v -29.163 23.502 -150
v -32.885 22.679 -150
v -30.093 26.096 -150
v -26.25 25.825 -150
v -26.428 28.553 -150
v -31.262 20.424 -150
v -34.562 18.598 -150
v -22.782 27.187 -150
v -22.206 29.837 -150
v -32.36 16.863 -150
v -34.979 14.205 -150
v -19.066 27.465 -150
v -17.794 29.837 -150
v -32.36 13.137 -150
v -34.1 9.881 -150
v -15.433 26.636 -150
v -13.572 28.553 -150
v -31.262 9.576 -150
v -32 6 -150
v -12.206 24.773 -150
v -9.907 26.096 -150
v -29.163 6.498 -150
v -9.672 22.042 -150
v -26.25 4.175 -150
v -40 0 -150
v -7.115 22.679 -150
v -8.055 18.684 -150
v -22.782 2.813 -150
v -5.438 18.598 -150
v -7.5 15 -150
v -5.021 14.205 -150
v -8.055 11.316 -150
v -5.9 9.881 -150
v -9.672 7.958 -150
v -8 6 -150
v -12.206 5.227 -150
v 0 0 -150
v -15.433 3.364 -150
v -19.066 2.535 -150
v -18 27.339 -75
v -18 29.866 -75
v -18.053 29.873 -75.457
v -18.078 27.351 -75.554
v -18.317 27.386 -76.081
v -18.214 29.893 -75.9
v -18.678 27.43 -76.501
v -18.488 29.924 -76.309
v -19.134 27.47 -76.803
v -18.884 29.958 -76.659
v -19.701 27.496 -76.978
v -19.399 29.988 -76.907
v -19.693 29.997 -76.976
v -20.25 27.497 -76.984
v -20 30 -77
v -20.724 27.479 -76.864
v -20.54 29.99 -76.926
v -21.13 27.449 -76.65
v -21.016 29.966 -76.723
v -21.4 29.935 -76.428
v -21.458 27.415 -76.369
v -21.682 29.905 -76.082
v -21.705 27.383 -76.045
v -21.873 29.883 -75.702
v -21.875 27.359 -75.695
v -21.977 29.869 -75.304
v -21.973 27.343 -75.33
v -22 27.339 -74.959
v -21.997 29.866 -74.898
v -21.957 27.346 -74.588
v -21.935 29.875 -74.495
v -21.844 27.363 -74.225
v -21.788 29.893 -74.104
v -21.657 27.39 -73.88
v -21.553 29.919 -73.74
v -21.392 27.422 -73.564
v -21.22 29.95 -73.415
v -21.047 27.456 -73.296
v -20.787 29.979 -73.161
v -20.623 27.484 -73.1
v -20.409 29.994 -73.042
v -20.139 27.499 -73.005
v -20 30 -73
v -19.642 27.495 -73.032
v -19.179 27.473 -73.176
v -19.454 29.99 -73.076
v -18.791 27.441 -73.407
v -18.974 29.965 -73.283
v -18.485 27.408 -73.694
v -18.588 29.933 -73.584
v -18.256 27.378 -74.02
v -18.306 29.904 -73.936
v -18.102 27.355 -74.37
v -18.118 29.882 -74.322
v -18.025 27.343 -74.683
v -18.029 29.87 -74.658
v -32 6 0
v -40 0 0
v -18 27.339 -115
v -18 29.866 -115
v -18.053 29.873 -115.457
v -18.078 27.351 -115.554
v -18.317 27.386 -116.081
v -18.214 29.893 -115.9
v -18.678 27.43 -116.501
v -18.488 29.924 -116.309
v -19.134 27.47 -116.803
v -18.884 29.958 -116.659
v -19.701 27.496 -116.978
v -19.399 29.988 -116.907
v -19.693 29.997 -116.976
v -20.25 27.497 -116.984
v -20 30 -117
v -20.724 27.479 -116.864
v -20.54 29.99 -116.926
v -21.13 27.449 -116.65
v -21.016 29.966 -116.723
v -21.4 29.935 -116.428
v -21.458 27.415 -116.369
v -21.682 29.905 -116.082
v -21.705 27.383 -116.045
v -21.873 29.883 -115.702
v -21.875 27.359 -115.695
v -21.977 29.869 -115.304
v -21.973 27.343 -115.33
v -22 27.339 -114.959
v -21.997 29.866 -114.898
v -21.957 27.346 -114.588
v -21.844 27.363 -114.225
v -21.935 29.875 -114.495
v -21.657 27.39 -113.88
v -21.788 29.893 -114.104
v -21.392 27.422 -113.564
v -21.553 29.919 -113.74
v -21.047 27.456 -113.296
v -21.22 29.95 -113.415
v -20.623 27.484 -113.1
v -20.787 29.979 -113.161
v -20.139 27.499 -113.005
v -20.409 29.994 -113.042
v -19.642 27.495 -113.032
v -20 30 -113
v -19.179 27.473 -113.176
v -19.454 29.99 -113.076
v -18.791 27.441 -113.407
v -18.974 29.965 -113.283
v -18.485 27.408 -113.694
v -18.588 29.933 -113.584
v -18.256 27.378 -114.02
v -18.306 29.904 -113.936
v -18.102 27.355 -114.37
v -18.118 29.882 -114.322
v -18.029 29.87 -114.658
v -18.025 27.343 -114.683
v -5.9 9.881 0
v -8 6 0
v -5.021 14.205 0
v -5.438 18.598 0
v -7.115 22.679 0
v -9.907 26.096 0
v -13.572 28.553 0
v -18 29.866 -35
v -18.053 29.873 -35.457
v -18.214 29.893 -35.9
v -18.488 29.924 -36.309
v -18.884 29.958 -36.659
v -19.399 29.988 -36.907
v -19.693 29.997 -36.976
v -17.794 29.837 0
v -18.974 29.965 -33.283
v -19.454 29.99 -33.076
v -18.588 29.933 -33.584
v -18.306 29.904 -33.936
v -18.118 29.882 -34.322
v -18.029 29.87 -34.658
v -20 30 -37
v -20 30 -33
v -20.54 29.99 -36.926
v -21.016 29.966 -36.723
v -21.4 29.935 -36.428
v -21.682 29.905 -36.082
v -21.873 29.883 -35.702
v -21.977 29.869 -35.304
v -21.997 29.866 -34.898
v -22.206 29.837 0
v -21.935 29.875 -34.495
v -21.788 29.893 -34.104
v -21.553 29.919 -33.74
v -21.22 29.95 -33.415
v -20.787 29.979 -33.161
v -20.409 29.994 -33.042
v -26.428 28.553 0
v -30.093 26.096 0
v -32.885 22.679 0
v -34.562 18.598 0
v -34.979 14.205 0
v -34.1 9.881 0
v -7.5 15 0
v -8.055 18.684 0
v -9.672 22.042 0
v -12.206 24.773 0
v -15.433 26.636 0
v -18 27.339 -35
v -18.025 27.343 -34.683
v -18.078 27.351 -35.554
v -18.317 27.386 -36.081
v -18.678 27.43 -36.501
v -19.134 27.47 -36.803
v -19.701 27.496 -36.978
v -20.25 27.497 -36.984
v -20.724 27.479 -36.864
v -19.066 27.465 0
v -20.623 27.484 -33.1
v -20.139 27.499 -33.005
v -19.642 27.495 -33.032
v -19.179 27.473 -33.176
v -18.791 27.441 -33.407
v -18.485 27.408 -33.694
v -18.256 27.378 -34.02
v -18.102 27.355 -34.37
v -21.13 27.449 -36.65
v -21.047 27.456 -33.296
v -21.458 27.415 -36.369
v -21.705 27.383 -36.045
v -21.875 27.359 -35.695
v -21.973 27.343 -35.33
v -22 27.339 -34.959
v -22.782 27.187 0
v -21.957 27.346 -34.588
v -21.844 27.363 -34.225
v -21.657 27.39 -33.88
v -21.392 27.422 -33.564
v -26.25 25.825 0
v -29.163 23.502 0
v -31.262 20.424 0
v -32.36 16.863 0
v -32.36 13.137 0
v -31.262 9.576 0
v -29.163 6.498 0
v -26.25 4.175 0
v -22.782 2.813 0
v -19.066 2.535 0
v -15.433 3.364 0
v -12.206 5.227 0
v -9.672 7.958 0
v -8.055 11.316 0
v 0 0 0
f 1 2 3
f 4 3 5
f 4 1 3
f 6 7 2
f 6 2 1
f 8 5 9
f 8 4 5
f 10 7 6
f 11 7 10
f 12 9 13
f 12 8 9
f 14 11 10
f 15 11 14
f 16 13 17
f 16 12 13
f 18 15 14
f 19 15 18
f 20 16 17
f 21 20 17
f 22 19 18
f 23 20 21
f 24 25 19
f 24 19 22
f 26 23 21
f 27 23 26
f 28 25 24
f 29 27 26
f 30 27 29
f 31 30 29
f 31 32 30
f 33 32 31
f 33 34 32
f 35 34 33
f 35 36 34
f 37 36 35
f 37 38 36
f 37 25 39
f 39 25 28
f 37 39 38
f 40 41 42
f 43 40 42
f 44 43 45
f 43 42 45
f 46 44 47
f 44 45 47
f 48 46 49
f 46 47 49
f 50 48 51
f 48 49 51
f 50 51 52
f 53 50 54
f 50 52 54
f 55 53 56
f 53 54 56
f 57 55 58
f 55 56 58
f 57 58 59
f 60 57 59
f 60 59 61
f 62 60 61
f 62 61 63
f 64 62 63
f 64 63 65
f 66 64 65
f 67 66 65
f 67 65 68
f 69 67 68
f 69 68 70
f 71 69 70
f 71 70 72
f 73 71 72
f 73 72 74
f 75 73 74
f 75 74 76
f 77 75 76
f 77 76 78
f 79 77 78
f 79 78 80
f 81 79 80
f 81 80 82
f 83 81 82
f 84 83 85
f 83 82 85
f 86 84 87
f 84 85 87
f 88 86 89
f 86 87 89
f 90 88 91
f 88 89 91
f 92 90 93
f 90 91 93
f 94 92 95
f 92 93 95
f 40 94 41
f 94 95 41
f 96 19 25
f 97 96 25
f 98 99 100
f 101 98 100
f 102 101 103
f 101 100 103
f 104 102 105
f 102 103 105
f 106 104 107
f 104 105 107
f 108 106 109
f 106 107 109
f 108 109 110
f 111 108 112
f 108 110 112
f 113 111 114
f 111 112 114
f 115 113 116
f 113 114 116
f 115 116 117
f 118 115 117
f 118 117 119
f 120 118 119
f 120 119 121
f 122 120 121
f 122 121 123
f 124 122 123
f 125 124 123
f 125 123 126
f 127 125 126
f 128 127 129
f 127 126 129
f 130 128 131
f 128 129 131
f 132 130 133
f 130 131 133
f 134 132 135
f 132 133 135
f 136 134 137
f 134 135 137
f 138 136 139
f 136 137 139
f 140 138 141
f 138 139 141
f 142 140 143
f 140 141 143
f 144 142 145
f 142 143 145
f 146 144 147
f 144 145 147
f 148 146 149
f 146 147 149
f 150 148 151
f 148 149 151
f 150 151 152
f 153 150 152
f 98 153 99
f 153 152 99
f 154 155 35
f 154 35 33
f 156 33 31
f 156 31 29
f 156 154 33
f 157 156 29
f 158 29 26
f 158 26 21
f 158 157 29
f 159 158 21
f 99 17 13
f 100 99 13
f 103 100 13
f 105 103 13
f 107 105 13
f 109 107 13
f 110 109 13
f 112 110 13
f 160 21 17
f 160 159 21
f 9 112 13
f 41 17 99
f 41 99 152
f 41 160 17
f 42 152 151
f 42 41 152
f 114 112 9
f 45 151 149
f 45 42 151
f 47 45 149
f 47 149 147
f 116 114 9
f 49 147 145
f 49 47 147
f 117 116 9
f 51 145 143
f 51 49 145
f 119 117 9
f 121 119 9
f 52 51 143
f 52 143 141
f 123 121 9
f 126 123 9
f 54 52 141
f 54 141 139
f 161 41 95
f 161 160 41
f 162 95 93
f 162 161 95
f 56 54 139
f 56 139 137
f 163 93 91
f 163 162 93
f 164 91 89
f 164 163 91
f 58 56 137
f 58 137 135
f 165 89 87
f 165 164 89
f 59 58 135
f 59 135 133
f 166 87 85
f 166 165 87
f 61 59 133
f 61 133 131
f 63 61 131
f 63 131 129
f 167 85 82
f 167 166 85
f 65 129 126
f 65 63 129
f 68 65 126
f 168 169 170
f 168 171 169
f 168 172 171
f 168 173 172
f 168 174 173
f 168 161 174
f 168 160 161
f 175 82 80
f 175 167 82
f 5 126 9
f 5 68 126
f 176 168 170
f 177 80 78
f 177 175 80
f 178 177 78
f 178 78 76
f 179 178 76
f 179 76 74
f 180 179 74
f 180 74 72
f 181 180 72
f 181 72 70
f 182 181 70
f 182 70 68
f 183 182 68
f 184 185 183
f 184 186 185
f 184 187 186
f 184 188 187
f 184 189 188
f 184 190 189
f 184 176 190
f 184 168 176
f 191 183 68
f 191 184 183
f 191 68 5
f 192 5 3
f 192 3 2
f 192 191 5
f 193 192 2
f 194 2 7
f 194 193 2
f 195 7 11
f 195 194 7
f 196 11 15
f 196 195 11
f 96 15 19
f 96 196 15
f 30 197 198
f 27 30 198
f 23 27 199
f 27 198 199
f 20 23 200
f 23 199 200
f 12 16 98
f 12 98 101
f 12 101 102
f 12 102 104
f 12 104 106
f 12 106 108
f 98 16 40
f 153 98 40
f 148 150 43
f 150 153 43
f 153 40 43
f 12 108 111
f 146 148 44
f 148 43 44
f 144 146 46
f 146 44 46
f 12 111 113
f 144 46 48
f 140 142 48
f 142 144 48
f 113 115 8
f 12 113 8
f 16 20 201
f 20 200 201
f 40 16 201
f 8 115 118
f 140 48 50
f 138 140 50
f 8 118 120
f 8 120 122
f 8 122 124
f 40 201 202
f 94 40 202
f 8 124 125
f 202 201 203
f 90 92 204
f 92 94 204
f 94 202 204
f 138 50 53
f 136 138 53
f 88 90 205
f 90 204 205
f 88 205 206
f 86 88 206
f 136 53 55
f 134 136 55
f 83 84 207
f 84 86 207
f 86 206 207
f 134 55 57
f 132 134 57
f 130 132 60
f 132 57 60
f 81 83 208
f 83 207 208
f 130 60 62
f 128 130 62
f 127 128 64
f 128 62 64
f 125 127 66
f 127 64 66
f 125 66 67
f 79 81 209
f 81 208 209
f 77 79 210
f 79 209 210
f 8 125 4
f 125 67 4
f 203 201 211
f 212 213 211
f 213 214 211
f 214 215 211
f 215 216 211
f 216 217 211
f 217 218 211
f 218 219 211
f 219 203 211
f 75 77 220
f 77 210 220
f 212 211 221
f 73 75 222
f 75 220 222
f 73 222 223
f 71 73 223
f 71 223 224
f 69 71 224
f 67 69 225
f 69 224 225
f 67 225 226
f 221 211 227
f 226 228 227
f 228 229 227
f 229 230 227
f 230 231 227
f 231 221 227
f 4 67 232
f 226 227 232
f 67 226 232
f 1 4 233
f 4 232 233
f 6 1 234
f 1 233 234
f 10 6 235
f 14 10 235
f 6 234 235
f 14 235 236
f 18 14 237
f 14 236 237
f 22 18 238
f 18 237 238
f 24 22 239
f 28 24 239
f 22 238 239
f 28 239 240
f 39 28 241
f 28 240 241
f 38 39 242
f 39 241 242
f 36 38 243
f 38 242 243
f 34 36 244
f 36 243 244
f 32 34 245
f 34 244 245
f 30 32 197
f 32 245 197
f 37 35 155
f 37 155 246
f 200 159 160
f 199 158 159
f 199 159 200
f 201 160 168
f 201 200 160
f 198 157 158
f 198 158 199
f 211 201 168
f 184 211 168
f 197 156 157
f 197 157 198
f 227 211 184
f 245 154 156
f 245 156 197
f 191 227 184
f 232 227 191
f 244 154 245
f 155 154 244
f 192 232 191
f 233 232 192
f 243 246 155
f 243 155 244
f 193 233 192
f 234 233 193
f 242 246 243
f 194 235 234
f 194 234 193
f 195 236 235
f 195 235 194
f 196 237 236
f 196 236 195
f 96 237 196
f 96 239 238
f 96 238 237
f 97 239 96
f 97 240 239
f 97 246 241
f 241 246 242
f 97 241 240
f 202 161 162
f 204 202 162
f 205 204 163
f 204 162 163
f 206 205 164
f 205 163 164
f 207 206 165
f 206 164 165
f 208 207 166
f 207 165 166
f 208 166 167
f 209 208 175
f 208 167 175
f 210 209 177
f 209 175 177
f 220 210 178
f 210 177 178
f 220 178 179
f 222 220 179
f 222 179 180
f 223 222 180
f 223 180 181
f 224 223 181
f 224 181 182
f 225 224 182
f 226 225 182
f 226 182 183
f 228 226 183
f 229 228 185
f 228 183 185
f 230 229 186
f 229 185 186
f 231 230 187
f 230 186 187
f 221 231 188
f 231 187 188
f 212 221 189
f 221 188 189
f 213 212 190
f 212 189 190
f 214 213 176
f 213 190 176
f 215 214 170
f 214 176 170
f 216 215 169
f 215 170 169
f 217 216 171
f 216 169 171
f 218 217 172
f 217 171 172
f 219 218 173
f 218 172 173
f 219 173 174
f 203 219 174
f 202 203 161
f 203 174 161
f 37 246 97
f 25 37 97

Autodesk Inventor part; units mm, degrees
ref_plane "YZ Plane" through (0, 0, 0) normal (1, 0, 0) x (0, 1, 0)
ref_plane "XZ Plane" through (0, 0, 0) normal (0, 1, 0) x (-1, 0, 0)
ref_plane "XY Plane" through (0, 0, 0) normal (0, 0, 1) x (1, 0, 0)
sketch "Sketch1" plane through (0, 0, 0) normal (0, 1, 0) x (-1, 0, 0)
  line L0 (0, 0) -> (60, 0)
  line L1 (60, 0) -> (60, -150)
  line L2 (60, -150) -> (0, -150)
  line L3 (0, -150) -> (0, 0)
  line L4 (0, 0) -> (40, 0)
  line L5 (40, 0) -> (40, -150)
  line L6 (40, -150) -> (0, -150)
  line L7 (0, -150) -> (0, 0)
  dimension "d0" = 60
  dimension "d1" = 150
  dimension "d2" = 40
extrude "Extrusion1" add sketch "Sketch1" along normal blind 30 contours L0 L5 L2 L3
sketch "Sketch2" plane through (0, 30, 0) normal (0, 1, 0) x (1, 0, 0)
  line L0 (0, 150) -> (-40, 150) projected
  line L1 (-20, 150) -> (-20, 0)
  line L2 (-20, 0) -> (-20, 75)
  line L3 (-20, 75) -> (-20, 150)
  line L4 (-20, 75) -> (-20, 115)
  line L5 (-20, 75) -> (-20, 35)
  line L6 (-20, 35) -> (-20, 115)
  circle A0 centre (-20, 35) radius 1.65
  circle A1 centre (-20, 75) radius 1.75
  circle A2 centre (-20, 35) radius 1.75
  circle A3 centre (-20, 115) radius 1.75
  circle A4 centre (-20, 35) radius 2
  circle A5 centre (-20, 75) radius 2
  circle A6 centre (-20, 115) radius 2
  point P0 (0, 0)
  dimension "d5" = 40
  dimension "d6" = 40
  dimension "d7" = 3.3
  dimension "d8" = 3.5
  dimension "d9" = 3.5
  dimension "d10" = 3.5
  dimension "d11" = 4
  dimension "d12" = 4
  dimension "d13" = 4
extrude "Extrusion2" cut sketch "Sketch2" against normal blind 4
sketch "Sketch3" plane through (-40, 0, 0) normal (0, 0, 1) x (1, 0, 0)
  line L0 (0, 0) -> (0, 30) projected
  line L1 (40, 0) -> (40, 30) projected
  line L2 (0, 30) -> (40, 30)
  line L3 (40, 30) -> (40, 15)
  line L4 (40, 15) -> (0, 15)
  line L5 (0, 15) -> (0, 30)
  line L6 (0, 0) -> (40, 0) projected
  line L7 (40, 15) -> (20, 15)
  line L8 (20, 15) -> (20, 0)
  line L9 (20, 0) -> (40, 0)
  line L10 (40, 0) -> (40, 15)
  circle A0 centre (20, 15) radius 15
  line L11 (0, 0) -> (40, 0)
  line L12 (40, 0) -> (40, -5)
  line L13 (40, -5) -> (0, -5)
  line L14 (0, -5) -> (0, 0)
  circle A1 centre (20, 15) radius 12.5
  line L15 (20, 15) -> (0, 0)
  line L16 (20, 15) -> (40, 0)
  point P0 (20, 30)
  point P1 (32, 6)
  point P2 (8, 6)
  dimension "d16" = 30
  dimension "d17" = 5
  dimension "d18" = 25
extrude "Extrusion3" cut sketch "Sketch3" against normal blind 150 contours L0 L4 A0 L15 | L0 L2 A0 L4 | L16 A0 L4 L1 | A1 L15 L8 | L8 L16 A1 | A1 L4 L15 | L2 L1 L4 A0 | A1 L4 | L4 A1 L16
properties part number "Pin Cylinder"
